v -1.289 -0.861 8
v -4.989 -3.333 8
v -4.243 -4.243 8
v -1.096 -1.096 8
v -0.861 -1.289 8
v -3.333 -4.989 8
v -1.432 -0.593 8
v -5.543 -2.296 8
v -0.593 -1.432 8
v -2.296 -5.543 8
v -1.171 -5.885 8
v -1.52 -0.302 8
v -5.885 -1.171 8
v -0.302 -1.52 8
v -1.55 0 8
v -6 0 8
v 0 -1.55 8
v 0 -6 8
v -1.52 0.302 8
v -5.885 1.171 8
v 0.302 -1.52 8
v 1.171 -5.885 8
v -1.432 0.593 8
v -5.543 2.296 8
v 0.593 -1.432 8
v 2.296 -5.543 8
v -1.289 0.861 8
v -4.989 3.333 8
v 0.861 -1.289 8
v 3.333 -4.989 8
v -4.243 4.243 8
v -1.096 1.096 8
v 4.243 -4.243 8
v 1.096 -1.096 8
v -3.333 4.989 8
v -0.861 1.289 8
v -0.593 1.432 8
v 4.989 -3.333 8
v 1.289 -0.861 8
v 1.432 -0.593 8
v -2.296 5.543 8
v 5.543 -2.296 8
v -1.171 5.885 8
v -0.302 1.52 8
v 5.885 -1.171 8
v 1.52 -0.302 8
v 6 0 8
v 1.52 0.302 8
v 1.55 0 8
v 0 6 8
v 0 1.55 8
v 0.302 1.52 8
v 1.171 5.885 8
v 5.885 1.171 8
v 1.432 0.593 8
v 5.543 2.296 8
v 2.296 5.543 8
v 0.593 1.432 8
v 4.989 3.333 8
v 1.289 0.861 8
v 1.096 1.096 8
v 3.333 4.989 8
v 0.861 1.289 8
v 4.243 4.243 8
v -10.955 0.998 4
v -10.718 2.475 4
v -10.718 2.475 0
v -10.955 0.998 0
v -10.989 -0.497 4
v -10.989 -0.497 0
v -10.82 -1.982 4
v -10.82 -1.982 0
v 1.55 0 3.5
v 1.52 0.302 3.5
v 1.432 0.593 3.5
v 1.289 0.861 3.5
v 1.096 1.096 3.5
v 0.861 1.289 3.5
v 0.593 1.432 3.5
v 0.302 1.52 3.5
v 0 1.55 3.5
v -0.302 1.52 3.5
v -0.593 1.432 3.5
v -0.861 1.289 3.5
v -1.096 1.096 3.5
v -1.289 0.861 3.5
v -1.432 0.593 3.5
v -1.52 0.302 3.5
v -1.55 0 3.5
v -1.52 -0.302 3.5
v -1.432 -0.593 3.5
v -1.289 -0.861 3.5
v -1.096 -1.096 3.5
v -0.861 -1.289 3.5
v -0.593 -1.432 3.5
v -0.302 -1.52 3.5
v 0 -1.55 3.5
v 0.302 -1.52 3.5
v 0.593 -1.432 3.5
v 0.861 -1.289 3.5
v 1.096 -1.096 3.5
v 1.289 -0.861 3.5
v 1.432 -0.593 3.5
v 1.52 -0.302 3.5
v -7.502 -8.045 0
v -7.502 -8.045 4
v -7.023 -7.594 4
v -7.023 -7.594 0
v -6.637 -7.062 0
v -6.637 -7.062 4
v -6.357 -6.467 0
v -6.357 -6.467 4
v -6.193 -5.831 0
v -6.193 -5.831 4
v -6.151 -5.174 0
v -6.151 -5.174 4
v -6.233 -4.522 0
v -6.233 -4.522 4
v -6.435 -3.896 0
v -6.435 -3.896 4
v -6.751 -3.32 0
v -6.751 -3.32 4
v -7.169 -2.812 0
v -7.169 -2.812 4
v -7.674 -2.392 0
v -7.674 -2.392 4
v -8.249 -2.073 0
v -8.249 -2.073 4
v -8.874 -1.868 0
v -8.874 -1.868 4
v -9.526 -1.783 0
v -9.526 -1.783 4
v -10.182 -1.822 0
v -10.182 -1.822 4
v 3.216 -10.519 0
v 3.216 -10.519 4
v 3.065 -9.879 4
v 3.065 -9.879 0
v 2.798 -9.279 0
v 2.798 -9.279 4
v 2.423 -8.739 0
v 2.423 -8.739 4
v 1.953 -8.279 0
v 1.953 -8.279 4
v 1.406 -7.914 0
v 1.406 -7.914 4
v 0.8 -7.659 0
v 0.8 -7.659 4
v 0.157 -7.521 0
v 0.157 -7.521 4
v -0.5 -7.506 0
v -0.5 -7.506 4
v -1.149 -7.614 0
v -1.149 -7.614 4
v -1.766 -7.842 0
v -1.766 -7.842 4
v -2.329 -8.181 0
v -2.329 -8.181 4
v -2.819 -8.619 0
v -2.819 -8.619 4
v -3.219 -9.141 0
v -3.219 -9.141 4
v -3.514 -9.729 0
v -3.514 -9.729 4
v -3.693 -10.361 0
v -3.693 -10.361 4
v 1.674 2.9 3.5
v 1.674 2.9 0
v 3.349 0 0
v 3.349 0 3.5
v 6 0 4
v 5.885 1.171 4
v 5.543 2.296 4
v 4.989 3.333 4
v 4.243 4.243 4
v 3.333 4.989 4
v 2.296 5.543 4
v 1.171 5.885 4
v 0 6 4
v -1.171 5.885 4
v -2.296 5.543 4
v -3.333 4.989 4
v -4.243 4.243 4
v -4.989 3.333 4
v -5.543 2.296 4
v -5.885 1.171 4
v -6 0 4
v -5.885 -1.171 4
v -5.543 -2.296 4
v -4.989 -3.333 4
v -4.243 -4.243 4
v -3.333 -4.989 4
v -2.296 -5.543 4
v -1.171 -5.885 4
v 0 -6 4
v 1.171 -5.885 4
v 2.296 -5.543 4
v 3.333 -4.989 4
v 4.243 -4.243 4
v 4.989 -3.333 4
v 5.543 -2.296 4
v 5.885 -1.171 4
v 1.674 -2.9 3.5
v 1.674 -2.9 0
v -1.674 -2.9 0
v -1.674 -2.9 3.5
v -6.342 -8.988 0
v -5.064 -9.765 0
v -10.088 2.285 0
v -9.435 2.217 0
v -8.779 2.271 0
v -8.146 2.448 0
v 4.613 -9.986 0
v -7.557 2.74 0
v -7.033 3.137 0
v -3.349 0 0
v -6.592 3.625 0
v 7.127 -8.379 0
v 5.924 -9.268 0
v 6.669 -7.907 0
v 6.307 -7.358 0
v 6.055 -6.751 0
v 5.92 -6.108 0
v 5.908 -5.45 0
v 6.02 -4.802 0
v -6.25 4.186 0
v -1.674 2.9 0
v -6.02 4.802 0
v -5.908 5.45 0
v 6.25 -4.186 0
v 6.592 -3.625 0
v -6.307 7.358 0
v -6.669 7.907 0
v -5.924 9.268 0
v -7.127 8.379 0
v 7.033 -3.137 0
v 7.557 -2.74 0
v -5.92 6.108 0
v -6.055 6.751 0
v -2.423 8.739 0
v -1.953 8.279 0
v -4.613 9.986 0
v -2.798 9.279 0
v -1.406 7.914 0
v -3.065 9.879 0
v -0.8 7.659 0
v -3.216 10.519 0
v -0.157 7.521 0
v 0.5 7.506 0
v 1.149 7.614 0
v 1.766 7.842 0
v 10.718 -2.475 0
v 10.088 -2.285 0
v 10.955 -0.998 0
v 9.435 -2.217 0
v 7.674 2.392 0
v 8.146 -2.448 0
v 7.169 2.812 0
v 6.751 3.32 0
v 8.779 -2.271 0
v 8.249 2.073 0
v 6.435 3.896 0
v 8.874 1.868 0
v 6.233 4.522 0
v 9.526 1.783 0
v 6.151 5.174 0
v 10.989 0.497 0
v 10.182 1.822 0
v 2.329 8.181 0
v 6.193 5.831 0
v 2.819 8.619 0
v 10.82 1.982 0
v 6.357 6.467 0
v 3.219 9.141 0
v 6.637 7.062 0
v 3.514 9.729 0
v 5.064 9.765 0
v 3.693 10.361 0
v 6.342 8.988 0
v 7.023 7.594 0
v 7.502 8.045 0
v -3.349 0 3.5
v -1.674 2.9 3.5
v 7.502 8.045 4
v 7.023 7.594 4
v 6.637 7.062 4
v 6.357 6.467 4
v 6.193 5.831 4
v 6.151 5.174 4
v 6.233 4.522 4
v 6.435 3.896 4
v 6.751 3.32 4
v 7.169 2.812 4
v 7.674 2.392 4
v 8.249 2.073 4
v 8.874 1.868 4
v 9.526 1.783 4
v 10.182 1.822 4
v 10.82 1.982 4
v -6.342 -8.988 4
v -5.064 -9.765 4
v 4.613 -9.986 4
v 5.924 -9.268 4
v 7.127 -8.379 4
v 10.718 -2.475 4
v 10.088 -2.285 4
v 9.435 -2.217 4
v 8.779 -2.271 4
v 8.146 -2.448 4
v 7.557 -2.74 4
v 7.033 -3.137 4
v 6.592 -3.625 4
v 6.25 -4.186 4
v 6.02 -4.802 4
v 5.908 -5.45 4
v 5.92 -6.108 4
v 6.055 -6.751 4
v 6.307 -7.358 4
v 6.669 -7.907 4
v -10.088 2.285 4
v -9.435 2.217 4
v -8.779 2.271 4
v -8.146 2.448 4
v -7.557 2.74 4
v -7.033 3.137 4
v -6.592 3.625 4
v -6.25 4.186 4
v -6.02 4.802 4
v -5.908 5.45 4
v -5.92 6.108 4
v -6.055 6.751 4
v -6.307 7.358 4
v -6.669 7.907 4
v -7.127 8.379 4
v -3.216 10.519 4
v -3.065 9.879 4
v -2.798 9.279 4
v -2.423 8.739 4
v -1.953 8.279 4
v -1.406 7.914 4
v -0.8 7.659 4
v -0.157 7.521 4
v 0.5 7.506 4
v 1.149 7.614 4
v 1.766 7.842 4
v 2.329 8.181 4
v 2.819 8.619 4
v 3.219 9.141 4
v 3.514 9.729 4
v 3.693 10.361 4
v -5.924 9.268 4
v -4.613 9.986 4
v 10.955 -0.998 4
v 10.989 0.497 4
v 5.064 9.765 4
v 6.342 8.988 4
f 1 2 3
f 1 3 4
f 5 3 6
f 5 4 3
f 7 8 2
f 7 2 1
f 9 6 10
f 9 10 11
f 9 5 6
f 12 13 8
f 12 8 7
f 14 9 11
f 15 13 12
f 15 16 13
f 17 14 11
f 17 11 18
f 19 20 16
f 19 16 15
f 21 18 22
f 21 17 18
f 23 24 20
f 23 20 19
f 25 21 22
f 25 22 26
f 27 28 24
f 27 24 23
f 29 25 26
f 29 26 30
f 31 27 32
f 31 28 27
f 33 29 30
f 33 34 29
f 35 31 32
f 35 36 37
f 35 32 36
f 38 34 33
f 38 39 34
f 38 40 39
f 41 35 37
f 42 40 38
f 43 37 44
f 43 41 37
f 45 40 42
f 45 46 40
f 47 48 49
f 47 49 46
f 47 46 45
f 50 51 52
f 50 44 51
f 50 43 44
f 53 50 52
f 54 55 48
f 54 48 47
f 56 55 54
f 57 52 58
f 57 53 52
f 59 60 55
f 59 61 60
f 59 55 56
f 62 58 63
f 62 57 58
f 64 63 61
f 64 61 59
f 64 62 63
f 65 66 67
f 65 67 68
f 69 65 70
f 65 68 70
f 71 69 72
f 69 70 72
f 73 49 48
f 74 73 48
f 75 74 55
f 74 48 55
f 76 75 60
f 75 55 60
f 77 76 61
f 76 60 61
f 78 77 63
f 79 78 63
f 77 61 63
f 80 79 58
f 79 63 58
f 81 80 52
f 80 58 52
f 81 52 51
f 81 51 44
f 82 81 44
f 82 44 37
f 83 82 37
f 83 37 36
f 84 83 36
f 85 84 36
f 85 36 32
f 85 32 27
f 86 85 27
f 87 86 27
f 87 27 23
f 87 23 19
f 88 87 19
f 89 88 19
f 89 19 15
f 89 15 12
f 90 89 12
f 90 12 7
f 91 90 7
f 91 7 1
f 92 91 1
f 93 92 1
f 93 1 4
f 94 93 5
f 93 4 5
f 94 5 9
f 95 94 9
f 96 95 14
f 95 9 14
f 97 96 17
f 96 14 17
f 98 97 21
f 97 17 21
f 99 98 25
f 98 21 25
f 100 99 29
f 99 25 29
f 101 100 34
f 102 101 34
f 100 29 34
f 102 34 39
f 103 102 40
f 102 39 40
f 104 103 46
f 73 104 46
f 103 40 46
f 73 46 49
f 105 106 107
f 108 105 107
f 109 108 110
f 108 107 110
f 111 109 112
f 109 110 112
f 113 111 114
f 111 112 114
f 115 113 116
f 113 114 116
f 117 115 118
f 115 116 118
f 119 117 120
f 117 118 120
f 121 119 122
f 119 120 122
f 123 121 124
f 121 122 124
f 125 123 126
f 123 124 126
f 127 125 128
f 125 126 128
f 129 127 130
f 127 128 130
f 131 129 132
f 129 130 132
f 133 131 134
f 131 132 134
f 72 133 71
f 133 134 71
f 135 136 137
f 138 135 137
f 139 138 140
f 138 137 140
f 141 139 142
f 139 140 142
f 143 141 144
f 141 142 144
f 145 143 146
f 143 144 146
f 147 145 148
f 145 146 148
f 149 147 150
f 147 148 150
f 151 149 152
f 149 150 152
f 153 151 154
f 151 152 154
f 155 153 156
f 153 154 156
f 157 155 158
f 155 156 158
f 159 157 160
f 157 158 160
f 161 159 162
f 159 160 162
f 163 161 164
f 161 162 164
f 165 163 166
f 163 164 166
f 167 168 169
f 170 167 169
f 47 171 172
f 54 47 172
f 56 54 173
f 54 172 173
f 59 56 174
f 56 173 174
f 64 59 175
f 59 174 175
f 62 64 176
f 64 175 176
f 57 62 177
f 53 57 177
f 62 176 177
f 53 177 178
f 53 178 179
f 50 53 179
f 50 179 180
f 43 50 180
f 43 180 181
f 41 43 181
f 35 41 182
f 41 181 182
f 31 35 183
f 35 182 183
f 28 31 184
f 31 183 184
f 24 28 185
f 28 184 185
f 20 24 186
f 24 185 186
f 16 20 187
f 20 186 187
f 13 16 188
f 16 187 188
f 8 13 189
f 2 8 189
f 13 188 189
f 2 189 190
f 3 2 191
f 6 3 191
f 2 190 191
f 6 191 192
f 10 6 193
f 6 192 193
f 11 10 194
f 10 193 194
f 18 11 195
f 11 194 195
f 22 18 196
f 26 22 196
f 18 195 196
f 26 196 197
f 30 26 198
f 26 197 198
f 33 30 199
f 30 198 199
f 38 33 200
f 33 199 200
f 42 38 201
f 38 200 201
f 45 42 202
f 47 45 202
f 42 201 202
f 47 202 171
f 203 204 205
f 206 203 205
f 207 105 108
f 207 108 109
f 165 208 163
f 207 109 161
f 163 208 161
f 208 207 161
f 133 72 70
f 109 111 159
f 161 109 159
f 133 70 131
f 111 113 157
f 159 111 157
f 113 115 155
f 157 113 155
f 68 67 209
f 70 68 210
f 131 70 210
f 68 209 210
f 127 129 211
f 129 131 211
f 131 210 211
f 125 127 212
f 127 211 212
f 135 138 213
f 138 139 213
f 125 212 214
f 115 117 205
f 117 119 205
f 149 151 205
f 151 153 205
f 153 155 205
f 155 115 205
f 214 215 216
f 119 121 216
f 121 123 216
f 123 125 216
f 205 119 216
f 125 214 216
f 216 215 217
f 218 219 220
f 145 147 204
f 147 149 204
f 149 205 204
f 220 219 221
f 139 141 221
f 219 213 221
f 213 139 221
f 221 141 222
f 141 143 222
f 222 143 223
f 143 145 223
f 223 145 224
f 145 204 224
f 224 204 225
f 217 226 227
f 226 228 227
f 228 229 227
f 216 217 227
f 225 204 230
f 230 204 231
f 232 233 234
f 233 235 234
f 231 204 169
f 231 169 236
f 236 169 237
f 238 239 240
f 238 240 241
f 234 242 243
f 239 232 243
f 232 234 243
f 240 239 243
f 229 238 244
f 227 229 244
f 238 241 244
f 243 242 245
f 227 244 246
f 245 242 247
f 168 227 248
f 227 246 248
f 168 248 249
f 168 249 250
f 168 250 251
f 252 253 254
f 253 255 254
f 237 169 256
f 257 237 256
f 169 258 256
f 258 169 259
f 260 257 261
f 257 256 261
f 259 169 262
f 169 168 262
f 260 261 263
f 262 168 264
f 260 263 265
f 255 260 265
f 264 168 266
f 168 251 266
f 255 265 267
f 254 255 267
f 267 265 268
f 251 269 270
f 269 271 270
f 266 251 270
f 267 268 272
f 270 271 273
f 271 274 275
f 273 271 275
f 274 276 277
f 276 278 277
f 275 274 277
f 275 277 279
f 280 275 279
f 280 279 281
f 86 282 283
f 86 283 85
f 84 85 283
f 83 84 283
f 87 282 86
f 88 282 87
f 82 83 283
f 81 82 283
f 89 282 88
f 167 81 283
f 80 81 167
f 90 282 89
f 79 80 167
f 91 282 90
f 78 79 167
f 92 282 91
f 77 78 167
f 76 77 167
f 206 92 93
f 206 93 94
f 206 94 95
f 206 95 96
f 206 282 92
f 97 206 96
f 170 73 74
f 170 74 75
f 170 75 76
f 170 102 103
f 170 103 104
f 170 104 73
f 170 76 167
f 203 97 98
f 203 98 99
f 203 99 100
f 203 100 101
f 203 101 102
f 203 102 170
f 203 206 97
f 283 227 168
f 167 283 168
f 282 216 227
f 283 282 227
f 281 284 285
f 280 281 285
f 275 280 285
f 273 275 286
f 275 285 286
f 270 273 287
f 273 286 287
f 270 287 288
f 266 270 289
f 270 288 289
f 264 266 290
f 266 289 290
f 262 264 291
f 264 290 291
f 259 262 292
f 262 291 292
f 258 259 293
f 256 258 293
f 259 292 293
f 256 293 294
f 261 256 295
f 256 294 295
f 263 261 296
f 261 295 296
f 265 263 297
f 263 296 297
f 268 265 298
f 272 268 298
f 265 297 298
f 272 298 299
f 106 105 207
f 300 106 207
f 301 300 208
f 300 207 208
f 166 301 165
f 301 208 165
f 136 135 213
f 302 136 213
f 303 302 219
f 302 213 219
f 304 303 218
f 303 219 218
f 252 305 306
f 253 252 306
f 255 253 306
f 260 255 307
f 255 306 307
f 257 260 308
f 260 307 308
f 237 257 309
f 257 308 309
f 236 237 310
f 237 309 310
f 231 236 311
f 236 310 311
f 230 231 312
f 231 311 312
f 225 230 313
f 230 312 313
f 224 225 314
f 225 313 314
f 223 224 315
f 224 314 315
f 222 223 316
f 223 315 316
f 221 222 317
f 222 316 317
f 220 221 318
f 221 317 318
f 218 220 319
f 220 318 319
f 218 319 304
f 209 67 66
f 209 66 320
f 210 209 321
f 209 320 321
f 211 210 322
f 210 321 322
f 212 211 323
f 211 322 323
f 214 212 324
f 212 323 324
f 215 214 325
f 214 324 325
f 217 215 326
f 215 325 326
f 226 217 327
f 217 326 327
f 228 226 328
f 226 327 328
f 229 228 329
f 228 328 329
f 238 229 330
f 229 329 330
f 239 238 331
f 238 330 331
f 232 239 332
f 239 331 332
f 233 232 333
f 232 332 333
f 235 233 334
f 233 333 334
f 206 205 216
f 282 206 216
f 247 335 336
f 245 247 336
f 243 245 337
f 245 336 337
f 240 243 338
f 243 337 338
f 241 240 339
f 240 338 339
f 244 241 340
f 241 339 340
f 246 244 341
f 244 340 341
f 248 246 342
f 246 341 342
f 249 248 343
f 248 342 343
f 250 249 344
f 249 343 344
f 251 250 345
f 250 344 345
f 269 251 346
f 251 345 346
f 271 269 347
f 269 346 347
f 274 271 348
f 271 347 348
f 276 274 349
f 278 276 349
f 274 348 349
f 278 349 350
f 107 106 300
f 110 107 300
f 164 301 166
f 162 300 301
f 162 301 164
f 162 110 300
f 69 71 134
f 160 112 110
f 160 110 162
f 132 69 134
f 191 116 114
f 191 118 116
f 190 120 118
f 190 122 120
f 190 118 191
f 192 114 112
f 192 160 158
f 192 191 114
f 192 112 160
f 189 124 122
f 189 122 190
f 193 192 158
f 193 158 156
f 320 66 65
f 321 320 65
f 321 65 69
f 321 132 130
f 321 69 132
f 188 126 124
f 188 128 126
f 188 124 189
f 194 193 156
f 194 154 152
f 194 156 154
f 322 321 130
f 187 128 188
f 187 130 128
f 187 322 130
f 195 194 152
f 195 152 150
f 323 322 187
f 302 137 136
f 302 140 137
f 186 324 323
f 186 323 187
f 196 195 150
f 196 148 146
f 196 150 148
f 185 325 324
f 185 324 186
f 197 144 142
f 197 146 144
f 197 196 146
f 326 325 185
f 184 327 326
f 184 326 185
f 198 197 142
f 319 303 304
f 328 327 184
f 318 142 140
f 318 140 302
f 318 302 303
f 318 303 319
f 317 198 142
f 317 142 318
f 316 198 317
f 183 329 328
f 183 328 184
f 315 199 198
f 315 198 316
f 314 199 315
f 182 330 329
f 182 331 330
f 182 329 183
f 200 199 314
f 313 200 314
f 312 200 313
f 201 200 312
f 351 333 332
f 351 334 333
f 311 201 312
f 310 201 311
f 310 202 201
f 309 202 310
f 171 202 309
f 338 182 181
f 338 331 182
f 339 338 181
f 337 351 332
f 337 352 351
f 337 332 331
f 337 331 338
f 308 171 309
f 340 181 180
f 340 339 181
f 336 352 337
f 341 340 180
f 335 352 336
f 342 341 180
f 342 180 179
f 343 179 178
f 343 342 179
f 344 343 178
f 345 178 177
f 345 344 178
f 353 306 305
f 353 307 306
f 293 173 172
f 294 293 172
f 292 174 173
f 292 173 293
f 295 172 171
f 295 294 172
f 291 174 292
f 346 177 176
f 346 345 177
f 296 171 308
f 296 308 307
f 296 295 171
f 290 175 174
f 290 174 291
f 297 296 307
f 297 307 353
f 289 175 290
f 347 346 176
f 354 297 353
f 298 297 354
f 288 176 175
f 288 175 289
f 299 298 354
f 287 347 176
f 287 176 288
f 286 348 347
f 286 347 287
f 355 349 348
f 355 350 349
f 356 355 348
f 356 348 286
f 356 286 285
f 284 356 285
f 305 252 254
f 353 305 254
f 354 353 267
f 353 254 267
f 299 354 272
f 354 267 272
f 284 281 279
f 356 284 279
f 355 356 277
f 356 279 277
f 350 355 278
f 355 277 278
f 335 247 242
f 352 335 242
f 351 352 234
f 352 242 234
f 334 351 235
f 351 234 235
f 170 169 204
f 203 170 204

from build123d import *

# Parameters (mm, degrees)
F0_R      = 11
F1_DEPTH  = 4
F2_R      = 3.5
F3_DEPTH  = 4
F4_COUNT  = 6
F5_R      = 6
F6_DEPTH  = 4
F8_DEPTH  = 3.5
F9_R      = 1.55
F10_DEPTH = 8.001


with BuildPart() as f1:
    # F0 (on Top) → F1 (new body)
    with BuildSketch(Plane.XY):
        Circle(F0_R)
    extrude(amount=F1_DEPTH)

    # F4: F3 ×6 about axis
    f4_axis = Axis((0, 0, 4), (0, 0, 1))


with BuildPart() as f3:
    # F2 (on face) → F3 (new body, through all)
    with BuildSketch(Plane.XY.offset(4)):
        with Locations((0.2514506495, 10.9971256504)):
            Circle(F2_R)
    extrude(amount=-F3_DEPTH)


with BuildPart() as f1_1:
    add(f1.part)
    for i in range(1, F4_COUNT):
        add(f3.part.rotate(f4_axis, i * 360 / F4_COUNT), mode=Mode.SUBTRACT)

    # F4#seed: cut F3
    add(f3.part, mode=Mode.SUBTRACT)

    # F5 (on face) → F6 (join)
    with BuildSketch(Plane.XY.offset(4)):
        Circle(F5_R)
    extrude(amount=F6_DEPTH)

    # F7 (on face) → F8 (cut)
    with BuildSketch(Plane(origin=(0, 0, 0), x_dir=(1, 0, 0), z_dir=(0, 0, -1))):
        Polygon((1.6743157806, 2.9), (-1.6743157806, 2.9), (-3.3486315613, 0), (-1.6743157806, -2.9), (1.6743157806, -2.9), (3.3486315613, 0), align=None)
    extrude(amount=-F8_DEPTH, mode=Mode.SUBTRACT)

    # F9 (on face) → F10 (cut, through all)
    with BuildSketch(Plane.XY.offset(8)):
        Circle(F9_R)
    extrude(amount=-F10_DEPTH, mode=Mode.SUBTRACT)


solid = f1_1.part
